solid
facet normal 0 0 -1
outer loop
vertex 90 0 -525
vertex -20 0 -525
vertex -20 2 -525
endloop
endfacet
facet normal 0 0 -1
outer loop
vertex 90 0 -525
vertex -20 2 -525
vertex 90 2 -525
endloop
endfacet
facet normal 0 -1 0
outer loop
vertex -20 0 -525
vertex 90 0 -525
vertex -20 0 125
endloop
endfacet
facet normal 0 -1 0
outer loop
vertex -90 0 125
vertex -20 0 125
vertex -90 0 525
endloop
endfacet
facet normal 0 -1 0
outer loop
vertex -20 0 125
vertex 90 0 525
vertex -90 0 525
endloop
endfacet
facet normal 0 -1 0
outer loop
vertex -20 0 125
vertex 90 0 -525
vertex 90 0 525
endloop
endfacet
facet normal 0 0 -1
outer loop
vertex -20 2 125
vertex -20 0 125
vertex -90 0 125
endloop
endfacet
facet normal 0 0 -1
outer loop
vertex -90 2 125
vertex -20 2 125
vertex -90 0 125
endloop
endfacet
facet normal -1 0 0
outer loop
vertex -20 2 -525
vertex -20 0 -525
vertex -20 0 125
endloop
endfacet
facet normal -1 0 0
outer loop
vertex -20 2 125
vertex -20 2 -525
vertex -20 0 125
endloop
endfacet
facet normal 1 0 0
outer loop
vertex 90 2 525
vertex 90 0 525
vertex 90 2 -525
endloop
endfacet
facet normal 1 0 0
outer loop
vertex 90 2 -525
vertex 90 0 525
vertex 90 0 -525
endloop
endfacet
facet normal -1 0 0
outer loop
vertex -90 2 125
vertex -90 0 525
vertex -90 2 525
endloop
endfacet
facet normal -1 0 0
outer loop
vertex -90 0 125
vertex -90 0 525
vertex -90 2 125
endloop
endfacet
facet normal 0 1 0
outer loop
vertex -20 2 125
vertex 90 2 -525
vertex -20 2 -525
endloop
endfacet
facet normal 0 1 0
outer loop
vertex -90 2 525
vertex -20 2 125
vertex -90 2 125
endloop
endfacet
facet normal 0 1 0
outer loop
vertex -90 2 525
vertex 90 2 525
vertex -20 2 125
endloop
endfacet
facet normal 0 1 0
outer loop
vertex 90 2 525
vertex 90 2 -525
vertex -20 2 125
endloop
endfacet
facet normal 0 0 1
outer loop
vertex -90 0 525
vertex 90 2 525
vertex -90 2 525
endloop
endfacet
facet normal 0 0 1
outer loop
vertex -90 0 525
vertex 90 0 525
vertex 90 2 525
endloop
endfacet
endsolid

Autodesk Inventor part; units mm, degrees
ref_plane "YZ Plane" through (0, 0, 0) normal (1, 0, 0) x (0, 1, 0)
ref_plane "XZ Plane" through (0, 0, 0) normal (0, 1, 0) x (-1, 0, 0)
ref_plane "XY Plane" through (0, 0, 0) normal (0, 0, 1) x (1, 0, 0)
sketch "Sketch1" plane through (0, 0, 0) normal (0, 1, 0) x (-1, 0, 0)
  line L0 (20, -525) -> (-90, -525)
  line L1 (-90, 525) -> (90, 525)
  line L2 (0, 525) -> (0, -525)
  line L3 (20, -525) -> (20, 125)
  line L4 (20, 125) -> (90, 125)
  line L5 (90, 525) -> (90, 125)
  line L6 (20, 0) -> (-90, 0)
  line L7 (-90, 525) -> (-90, -525)
  point P0 (0, 0)
  dimension "d6" = 1050
  dimension "d7" = 180
  dimension "d8" = 70
  dimension "d10" = 650
extrude "Extrusion1" add sketch "Sketch1" along normal blind 2
properties part number "Mi" material "LCP Plastic"
